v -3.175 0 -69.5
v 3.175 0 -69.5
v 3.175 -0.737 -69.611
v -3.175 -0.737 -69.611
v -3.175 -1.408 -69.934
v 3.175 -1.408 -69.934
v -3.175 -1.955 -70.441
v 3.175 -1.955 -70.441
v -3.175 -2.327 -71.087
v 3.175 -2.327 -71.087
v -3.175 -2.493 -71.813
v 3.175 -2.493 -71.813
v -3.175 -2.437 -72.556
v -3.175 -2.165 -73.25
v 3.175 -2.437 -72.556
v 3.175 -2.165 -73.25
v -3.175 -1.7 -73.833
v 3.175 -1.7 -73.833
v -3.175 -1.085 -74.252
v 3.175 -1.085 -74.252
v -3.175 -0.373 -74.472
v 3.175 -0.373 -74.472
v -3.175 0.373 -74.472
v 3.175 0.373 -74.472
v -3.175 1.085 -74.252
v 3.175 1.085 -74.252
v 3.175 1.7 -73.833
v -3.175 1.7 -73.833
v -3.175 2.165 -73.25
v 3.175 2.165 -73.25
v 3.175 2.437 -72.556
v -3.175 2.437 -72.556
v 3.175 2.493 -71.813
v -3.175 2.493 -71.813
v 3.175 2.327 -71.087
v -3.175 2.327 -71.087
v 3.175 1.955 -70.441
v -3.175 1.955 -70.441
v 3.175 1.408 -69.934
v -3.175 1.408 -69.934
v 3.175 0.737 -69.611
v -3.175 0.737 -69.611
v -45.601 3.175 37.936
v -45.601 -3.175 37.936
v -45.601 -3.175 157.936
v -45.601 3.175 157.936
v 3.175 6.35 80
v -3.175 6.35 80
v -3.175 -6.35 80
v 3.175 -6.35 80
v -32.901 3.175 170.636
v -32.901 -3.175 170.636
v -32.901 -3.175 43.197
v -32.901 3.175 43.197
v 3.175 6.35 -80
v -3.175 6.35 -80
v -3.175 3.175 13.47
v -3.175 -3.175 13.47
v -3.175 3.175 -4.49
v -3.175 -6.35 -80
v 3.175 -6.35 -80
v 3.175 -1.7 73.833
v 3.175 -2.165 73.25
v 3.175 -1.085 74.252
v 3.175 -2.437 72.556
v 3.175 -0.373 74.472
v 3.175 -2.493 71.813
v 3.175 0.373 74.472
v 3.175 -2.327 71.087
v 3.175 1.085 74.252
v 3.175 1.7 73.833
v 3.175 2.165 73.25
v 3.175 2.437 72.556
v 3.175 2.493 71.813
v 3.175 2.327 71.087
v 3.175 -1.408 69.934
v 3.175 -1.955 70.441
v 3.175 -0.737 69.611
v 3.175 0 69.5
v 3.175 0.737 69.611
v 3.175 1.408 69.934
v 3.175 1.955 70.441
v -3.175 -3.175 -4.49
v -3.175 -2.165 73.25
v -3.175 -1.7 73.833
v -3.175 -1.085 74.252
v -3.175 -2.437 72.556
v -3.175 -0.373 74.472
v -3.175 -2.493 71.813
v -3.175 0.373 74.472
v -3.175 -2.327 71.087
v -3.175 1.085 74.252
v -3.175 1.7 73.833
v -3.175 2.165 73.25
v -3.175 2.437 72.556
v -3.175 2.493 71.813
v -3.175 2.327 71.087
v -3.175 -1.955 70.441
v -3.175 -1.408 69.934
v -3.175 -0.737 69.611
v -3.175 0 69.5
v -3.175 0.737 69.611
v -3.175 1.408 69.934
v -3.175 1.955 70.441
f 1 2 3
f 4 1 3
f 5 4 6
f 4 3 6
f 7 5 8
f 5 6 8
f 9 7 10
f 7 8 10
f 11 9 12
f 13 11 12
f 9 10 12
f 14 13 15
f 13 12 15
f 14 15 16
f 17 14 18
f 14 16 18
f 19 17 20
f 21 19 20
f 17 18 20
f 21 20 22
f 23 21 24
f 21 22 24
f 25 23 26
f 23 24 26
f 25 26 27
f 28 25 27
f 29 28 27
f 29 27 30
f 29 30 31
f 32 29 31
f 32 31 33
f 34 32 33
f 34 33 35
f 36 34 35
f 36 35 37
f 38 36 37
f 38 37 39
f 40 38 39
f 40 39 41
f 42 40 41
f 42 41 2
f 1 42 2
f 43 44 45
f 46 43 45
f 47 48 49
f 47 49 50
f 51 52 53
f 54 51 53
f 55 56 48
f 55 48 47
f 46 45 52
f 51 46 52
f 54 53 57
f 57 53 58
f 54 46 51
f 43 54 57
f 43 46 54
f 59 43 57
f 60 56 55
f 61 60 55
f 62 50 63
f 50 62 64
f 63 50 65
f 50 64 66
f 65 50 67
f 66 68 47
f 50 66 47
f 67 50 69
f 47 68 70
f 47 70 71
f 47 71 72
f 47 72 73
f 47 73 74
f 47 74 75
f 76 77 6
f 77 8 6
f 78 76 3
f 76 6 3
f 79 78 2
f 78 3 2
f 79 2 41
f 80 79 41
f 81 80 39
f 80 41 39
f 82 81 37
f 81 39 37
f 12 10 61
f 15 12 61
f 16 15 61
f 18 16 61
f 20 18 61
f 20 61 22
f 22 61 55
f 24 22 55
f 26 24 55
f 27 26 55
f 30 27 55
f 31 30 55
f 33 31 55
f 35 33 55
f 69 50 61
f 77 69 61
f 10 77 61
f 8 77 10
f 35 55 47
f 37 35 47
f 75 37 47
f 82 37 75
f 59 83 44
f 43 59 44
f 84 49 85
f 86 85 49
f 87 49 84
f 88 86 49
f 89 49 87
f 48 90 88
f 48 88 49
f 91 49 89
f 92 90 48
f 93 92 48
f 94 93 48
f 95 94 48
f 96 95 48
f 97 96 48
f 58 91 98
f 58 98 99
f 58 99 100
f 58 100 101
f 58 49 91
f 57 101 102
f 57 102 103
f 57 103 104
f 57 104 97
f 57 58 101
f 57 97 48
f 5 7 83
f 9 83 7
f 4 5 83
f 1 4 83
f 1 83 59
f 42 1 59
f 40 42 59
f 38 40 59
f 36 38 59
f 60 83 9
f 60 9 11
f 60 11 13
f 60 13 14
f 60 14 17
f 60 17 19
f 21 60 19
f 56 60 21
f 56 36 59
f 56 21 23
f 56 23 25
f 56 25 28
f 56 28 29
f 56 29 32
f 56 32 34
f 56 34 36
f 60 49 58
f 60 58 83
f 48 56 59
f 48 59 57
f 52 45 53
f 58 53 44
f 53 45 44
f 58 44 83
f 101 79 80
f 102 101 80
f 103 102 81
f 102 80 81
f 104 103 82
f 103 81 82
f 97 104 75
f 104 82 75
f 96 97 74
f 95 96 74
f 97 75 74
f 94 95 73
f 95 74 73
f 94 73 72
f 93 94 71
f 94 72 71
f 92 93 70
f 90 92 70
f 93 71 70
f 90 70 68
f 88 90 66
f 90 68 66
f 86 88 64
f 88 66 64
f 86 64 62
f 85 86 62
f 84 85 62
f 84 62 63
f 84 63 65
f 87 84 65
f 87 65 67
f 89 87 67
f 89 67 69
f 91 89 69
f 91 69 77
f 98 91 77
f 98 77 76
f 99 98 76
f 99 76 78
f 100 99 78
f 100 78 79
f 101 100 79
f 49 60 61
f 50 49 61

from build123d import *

# Parameters (mm, degrees)
BOSS_EXTRUDE1_DEPTH      = 80
BOSS_EXTRUDE1_DEPTH_BACK = 80
SKETCH2_W                = 6.35
SKETCH2_H                = 12.7
SKETCH4_R                = 2.5
CUT_EXTRUDE1_DEPTH       = 81.502453379
BOSS_EXTRUDE2_DEPTH      = 3.175
BOSS_EXTRUDE2_DEPTH_BACK = 3.175


with BuildPart() as part:
    # Sketch2 → Boss-Extrude1 (new, two sides: drawn at the far end of the back side and taken through both)
    with BuildSketch(Plane.XY.offset(-BOSS_EXTRUDE1_DEPTH_BACK)):
        Rectangle(SKETCH2_W, SKETCH2_H)
    extrude(amount=BOSS_EXTRUDE1_DEPTH + BOSS_EXTRUDE1_DEPTH_BACK)

    # Sketch4 → Cut-Extrude1 (cut, through all)
    with BuildSketch(Plane(origin=(3.175, 0, 0), x_dir=(0, 0, -1), z_dir=(1, 0, 0))):
        with Locations((-72, 0)):
            Circle(SKETCH4_R)
        with Locations((72, 0)):
            Circle(SKETCH4_R)
    extrude(amount=-CUT_EXTRUDE1_DEPTH, mode=Mode.SUBTRACT)

    # Sketch5 → Boss-Extrude2 (add, two sides: drawn at the far end of the back side and taken through both)
    with BuildSketch(Plane(origin=(0, 0, 0), x_dir=(0, 0, -1), z_dir=(0, 1, 0)).offset(-BOSS_EXTRUDE2_DEPTH_BACK)):
        Polygon((4.490128061, 3.175), (-37.936278811, 45.601406871), (-157.936278811, 45.601406871), (-170.636278811, 32.901406871), (-43.196791053, 32.901406871), (-7.120384182, -3.175), (-1.859871939, -3.175), align=None)
    extrude(amount=BOSS_EXTRUDE2_DEPTH + BOSS_EXTRUDE2_DEPTH_BACK)


solid = part.part
